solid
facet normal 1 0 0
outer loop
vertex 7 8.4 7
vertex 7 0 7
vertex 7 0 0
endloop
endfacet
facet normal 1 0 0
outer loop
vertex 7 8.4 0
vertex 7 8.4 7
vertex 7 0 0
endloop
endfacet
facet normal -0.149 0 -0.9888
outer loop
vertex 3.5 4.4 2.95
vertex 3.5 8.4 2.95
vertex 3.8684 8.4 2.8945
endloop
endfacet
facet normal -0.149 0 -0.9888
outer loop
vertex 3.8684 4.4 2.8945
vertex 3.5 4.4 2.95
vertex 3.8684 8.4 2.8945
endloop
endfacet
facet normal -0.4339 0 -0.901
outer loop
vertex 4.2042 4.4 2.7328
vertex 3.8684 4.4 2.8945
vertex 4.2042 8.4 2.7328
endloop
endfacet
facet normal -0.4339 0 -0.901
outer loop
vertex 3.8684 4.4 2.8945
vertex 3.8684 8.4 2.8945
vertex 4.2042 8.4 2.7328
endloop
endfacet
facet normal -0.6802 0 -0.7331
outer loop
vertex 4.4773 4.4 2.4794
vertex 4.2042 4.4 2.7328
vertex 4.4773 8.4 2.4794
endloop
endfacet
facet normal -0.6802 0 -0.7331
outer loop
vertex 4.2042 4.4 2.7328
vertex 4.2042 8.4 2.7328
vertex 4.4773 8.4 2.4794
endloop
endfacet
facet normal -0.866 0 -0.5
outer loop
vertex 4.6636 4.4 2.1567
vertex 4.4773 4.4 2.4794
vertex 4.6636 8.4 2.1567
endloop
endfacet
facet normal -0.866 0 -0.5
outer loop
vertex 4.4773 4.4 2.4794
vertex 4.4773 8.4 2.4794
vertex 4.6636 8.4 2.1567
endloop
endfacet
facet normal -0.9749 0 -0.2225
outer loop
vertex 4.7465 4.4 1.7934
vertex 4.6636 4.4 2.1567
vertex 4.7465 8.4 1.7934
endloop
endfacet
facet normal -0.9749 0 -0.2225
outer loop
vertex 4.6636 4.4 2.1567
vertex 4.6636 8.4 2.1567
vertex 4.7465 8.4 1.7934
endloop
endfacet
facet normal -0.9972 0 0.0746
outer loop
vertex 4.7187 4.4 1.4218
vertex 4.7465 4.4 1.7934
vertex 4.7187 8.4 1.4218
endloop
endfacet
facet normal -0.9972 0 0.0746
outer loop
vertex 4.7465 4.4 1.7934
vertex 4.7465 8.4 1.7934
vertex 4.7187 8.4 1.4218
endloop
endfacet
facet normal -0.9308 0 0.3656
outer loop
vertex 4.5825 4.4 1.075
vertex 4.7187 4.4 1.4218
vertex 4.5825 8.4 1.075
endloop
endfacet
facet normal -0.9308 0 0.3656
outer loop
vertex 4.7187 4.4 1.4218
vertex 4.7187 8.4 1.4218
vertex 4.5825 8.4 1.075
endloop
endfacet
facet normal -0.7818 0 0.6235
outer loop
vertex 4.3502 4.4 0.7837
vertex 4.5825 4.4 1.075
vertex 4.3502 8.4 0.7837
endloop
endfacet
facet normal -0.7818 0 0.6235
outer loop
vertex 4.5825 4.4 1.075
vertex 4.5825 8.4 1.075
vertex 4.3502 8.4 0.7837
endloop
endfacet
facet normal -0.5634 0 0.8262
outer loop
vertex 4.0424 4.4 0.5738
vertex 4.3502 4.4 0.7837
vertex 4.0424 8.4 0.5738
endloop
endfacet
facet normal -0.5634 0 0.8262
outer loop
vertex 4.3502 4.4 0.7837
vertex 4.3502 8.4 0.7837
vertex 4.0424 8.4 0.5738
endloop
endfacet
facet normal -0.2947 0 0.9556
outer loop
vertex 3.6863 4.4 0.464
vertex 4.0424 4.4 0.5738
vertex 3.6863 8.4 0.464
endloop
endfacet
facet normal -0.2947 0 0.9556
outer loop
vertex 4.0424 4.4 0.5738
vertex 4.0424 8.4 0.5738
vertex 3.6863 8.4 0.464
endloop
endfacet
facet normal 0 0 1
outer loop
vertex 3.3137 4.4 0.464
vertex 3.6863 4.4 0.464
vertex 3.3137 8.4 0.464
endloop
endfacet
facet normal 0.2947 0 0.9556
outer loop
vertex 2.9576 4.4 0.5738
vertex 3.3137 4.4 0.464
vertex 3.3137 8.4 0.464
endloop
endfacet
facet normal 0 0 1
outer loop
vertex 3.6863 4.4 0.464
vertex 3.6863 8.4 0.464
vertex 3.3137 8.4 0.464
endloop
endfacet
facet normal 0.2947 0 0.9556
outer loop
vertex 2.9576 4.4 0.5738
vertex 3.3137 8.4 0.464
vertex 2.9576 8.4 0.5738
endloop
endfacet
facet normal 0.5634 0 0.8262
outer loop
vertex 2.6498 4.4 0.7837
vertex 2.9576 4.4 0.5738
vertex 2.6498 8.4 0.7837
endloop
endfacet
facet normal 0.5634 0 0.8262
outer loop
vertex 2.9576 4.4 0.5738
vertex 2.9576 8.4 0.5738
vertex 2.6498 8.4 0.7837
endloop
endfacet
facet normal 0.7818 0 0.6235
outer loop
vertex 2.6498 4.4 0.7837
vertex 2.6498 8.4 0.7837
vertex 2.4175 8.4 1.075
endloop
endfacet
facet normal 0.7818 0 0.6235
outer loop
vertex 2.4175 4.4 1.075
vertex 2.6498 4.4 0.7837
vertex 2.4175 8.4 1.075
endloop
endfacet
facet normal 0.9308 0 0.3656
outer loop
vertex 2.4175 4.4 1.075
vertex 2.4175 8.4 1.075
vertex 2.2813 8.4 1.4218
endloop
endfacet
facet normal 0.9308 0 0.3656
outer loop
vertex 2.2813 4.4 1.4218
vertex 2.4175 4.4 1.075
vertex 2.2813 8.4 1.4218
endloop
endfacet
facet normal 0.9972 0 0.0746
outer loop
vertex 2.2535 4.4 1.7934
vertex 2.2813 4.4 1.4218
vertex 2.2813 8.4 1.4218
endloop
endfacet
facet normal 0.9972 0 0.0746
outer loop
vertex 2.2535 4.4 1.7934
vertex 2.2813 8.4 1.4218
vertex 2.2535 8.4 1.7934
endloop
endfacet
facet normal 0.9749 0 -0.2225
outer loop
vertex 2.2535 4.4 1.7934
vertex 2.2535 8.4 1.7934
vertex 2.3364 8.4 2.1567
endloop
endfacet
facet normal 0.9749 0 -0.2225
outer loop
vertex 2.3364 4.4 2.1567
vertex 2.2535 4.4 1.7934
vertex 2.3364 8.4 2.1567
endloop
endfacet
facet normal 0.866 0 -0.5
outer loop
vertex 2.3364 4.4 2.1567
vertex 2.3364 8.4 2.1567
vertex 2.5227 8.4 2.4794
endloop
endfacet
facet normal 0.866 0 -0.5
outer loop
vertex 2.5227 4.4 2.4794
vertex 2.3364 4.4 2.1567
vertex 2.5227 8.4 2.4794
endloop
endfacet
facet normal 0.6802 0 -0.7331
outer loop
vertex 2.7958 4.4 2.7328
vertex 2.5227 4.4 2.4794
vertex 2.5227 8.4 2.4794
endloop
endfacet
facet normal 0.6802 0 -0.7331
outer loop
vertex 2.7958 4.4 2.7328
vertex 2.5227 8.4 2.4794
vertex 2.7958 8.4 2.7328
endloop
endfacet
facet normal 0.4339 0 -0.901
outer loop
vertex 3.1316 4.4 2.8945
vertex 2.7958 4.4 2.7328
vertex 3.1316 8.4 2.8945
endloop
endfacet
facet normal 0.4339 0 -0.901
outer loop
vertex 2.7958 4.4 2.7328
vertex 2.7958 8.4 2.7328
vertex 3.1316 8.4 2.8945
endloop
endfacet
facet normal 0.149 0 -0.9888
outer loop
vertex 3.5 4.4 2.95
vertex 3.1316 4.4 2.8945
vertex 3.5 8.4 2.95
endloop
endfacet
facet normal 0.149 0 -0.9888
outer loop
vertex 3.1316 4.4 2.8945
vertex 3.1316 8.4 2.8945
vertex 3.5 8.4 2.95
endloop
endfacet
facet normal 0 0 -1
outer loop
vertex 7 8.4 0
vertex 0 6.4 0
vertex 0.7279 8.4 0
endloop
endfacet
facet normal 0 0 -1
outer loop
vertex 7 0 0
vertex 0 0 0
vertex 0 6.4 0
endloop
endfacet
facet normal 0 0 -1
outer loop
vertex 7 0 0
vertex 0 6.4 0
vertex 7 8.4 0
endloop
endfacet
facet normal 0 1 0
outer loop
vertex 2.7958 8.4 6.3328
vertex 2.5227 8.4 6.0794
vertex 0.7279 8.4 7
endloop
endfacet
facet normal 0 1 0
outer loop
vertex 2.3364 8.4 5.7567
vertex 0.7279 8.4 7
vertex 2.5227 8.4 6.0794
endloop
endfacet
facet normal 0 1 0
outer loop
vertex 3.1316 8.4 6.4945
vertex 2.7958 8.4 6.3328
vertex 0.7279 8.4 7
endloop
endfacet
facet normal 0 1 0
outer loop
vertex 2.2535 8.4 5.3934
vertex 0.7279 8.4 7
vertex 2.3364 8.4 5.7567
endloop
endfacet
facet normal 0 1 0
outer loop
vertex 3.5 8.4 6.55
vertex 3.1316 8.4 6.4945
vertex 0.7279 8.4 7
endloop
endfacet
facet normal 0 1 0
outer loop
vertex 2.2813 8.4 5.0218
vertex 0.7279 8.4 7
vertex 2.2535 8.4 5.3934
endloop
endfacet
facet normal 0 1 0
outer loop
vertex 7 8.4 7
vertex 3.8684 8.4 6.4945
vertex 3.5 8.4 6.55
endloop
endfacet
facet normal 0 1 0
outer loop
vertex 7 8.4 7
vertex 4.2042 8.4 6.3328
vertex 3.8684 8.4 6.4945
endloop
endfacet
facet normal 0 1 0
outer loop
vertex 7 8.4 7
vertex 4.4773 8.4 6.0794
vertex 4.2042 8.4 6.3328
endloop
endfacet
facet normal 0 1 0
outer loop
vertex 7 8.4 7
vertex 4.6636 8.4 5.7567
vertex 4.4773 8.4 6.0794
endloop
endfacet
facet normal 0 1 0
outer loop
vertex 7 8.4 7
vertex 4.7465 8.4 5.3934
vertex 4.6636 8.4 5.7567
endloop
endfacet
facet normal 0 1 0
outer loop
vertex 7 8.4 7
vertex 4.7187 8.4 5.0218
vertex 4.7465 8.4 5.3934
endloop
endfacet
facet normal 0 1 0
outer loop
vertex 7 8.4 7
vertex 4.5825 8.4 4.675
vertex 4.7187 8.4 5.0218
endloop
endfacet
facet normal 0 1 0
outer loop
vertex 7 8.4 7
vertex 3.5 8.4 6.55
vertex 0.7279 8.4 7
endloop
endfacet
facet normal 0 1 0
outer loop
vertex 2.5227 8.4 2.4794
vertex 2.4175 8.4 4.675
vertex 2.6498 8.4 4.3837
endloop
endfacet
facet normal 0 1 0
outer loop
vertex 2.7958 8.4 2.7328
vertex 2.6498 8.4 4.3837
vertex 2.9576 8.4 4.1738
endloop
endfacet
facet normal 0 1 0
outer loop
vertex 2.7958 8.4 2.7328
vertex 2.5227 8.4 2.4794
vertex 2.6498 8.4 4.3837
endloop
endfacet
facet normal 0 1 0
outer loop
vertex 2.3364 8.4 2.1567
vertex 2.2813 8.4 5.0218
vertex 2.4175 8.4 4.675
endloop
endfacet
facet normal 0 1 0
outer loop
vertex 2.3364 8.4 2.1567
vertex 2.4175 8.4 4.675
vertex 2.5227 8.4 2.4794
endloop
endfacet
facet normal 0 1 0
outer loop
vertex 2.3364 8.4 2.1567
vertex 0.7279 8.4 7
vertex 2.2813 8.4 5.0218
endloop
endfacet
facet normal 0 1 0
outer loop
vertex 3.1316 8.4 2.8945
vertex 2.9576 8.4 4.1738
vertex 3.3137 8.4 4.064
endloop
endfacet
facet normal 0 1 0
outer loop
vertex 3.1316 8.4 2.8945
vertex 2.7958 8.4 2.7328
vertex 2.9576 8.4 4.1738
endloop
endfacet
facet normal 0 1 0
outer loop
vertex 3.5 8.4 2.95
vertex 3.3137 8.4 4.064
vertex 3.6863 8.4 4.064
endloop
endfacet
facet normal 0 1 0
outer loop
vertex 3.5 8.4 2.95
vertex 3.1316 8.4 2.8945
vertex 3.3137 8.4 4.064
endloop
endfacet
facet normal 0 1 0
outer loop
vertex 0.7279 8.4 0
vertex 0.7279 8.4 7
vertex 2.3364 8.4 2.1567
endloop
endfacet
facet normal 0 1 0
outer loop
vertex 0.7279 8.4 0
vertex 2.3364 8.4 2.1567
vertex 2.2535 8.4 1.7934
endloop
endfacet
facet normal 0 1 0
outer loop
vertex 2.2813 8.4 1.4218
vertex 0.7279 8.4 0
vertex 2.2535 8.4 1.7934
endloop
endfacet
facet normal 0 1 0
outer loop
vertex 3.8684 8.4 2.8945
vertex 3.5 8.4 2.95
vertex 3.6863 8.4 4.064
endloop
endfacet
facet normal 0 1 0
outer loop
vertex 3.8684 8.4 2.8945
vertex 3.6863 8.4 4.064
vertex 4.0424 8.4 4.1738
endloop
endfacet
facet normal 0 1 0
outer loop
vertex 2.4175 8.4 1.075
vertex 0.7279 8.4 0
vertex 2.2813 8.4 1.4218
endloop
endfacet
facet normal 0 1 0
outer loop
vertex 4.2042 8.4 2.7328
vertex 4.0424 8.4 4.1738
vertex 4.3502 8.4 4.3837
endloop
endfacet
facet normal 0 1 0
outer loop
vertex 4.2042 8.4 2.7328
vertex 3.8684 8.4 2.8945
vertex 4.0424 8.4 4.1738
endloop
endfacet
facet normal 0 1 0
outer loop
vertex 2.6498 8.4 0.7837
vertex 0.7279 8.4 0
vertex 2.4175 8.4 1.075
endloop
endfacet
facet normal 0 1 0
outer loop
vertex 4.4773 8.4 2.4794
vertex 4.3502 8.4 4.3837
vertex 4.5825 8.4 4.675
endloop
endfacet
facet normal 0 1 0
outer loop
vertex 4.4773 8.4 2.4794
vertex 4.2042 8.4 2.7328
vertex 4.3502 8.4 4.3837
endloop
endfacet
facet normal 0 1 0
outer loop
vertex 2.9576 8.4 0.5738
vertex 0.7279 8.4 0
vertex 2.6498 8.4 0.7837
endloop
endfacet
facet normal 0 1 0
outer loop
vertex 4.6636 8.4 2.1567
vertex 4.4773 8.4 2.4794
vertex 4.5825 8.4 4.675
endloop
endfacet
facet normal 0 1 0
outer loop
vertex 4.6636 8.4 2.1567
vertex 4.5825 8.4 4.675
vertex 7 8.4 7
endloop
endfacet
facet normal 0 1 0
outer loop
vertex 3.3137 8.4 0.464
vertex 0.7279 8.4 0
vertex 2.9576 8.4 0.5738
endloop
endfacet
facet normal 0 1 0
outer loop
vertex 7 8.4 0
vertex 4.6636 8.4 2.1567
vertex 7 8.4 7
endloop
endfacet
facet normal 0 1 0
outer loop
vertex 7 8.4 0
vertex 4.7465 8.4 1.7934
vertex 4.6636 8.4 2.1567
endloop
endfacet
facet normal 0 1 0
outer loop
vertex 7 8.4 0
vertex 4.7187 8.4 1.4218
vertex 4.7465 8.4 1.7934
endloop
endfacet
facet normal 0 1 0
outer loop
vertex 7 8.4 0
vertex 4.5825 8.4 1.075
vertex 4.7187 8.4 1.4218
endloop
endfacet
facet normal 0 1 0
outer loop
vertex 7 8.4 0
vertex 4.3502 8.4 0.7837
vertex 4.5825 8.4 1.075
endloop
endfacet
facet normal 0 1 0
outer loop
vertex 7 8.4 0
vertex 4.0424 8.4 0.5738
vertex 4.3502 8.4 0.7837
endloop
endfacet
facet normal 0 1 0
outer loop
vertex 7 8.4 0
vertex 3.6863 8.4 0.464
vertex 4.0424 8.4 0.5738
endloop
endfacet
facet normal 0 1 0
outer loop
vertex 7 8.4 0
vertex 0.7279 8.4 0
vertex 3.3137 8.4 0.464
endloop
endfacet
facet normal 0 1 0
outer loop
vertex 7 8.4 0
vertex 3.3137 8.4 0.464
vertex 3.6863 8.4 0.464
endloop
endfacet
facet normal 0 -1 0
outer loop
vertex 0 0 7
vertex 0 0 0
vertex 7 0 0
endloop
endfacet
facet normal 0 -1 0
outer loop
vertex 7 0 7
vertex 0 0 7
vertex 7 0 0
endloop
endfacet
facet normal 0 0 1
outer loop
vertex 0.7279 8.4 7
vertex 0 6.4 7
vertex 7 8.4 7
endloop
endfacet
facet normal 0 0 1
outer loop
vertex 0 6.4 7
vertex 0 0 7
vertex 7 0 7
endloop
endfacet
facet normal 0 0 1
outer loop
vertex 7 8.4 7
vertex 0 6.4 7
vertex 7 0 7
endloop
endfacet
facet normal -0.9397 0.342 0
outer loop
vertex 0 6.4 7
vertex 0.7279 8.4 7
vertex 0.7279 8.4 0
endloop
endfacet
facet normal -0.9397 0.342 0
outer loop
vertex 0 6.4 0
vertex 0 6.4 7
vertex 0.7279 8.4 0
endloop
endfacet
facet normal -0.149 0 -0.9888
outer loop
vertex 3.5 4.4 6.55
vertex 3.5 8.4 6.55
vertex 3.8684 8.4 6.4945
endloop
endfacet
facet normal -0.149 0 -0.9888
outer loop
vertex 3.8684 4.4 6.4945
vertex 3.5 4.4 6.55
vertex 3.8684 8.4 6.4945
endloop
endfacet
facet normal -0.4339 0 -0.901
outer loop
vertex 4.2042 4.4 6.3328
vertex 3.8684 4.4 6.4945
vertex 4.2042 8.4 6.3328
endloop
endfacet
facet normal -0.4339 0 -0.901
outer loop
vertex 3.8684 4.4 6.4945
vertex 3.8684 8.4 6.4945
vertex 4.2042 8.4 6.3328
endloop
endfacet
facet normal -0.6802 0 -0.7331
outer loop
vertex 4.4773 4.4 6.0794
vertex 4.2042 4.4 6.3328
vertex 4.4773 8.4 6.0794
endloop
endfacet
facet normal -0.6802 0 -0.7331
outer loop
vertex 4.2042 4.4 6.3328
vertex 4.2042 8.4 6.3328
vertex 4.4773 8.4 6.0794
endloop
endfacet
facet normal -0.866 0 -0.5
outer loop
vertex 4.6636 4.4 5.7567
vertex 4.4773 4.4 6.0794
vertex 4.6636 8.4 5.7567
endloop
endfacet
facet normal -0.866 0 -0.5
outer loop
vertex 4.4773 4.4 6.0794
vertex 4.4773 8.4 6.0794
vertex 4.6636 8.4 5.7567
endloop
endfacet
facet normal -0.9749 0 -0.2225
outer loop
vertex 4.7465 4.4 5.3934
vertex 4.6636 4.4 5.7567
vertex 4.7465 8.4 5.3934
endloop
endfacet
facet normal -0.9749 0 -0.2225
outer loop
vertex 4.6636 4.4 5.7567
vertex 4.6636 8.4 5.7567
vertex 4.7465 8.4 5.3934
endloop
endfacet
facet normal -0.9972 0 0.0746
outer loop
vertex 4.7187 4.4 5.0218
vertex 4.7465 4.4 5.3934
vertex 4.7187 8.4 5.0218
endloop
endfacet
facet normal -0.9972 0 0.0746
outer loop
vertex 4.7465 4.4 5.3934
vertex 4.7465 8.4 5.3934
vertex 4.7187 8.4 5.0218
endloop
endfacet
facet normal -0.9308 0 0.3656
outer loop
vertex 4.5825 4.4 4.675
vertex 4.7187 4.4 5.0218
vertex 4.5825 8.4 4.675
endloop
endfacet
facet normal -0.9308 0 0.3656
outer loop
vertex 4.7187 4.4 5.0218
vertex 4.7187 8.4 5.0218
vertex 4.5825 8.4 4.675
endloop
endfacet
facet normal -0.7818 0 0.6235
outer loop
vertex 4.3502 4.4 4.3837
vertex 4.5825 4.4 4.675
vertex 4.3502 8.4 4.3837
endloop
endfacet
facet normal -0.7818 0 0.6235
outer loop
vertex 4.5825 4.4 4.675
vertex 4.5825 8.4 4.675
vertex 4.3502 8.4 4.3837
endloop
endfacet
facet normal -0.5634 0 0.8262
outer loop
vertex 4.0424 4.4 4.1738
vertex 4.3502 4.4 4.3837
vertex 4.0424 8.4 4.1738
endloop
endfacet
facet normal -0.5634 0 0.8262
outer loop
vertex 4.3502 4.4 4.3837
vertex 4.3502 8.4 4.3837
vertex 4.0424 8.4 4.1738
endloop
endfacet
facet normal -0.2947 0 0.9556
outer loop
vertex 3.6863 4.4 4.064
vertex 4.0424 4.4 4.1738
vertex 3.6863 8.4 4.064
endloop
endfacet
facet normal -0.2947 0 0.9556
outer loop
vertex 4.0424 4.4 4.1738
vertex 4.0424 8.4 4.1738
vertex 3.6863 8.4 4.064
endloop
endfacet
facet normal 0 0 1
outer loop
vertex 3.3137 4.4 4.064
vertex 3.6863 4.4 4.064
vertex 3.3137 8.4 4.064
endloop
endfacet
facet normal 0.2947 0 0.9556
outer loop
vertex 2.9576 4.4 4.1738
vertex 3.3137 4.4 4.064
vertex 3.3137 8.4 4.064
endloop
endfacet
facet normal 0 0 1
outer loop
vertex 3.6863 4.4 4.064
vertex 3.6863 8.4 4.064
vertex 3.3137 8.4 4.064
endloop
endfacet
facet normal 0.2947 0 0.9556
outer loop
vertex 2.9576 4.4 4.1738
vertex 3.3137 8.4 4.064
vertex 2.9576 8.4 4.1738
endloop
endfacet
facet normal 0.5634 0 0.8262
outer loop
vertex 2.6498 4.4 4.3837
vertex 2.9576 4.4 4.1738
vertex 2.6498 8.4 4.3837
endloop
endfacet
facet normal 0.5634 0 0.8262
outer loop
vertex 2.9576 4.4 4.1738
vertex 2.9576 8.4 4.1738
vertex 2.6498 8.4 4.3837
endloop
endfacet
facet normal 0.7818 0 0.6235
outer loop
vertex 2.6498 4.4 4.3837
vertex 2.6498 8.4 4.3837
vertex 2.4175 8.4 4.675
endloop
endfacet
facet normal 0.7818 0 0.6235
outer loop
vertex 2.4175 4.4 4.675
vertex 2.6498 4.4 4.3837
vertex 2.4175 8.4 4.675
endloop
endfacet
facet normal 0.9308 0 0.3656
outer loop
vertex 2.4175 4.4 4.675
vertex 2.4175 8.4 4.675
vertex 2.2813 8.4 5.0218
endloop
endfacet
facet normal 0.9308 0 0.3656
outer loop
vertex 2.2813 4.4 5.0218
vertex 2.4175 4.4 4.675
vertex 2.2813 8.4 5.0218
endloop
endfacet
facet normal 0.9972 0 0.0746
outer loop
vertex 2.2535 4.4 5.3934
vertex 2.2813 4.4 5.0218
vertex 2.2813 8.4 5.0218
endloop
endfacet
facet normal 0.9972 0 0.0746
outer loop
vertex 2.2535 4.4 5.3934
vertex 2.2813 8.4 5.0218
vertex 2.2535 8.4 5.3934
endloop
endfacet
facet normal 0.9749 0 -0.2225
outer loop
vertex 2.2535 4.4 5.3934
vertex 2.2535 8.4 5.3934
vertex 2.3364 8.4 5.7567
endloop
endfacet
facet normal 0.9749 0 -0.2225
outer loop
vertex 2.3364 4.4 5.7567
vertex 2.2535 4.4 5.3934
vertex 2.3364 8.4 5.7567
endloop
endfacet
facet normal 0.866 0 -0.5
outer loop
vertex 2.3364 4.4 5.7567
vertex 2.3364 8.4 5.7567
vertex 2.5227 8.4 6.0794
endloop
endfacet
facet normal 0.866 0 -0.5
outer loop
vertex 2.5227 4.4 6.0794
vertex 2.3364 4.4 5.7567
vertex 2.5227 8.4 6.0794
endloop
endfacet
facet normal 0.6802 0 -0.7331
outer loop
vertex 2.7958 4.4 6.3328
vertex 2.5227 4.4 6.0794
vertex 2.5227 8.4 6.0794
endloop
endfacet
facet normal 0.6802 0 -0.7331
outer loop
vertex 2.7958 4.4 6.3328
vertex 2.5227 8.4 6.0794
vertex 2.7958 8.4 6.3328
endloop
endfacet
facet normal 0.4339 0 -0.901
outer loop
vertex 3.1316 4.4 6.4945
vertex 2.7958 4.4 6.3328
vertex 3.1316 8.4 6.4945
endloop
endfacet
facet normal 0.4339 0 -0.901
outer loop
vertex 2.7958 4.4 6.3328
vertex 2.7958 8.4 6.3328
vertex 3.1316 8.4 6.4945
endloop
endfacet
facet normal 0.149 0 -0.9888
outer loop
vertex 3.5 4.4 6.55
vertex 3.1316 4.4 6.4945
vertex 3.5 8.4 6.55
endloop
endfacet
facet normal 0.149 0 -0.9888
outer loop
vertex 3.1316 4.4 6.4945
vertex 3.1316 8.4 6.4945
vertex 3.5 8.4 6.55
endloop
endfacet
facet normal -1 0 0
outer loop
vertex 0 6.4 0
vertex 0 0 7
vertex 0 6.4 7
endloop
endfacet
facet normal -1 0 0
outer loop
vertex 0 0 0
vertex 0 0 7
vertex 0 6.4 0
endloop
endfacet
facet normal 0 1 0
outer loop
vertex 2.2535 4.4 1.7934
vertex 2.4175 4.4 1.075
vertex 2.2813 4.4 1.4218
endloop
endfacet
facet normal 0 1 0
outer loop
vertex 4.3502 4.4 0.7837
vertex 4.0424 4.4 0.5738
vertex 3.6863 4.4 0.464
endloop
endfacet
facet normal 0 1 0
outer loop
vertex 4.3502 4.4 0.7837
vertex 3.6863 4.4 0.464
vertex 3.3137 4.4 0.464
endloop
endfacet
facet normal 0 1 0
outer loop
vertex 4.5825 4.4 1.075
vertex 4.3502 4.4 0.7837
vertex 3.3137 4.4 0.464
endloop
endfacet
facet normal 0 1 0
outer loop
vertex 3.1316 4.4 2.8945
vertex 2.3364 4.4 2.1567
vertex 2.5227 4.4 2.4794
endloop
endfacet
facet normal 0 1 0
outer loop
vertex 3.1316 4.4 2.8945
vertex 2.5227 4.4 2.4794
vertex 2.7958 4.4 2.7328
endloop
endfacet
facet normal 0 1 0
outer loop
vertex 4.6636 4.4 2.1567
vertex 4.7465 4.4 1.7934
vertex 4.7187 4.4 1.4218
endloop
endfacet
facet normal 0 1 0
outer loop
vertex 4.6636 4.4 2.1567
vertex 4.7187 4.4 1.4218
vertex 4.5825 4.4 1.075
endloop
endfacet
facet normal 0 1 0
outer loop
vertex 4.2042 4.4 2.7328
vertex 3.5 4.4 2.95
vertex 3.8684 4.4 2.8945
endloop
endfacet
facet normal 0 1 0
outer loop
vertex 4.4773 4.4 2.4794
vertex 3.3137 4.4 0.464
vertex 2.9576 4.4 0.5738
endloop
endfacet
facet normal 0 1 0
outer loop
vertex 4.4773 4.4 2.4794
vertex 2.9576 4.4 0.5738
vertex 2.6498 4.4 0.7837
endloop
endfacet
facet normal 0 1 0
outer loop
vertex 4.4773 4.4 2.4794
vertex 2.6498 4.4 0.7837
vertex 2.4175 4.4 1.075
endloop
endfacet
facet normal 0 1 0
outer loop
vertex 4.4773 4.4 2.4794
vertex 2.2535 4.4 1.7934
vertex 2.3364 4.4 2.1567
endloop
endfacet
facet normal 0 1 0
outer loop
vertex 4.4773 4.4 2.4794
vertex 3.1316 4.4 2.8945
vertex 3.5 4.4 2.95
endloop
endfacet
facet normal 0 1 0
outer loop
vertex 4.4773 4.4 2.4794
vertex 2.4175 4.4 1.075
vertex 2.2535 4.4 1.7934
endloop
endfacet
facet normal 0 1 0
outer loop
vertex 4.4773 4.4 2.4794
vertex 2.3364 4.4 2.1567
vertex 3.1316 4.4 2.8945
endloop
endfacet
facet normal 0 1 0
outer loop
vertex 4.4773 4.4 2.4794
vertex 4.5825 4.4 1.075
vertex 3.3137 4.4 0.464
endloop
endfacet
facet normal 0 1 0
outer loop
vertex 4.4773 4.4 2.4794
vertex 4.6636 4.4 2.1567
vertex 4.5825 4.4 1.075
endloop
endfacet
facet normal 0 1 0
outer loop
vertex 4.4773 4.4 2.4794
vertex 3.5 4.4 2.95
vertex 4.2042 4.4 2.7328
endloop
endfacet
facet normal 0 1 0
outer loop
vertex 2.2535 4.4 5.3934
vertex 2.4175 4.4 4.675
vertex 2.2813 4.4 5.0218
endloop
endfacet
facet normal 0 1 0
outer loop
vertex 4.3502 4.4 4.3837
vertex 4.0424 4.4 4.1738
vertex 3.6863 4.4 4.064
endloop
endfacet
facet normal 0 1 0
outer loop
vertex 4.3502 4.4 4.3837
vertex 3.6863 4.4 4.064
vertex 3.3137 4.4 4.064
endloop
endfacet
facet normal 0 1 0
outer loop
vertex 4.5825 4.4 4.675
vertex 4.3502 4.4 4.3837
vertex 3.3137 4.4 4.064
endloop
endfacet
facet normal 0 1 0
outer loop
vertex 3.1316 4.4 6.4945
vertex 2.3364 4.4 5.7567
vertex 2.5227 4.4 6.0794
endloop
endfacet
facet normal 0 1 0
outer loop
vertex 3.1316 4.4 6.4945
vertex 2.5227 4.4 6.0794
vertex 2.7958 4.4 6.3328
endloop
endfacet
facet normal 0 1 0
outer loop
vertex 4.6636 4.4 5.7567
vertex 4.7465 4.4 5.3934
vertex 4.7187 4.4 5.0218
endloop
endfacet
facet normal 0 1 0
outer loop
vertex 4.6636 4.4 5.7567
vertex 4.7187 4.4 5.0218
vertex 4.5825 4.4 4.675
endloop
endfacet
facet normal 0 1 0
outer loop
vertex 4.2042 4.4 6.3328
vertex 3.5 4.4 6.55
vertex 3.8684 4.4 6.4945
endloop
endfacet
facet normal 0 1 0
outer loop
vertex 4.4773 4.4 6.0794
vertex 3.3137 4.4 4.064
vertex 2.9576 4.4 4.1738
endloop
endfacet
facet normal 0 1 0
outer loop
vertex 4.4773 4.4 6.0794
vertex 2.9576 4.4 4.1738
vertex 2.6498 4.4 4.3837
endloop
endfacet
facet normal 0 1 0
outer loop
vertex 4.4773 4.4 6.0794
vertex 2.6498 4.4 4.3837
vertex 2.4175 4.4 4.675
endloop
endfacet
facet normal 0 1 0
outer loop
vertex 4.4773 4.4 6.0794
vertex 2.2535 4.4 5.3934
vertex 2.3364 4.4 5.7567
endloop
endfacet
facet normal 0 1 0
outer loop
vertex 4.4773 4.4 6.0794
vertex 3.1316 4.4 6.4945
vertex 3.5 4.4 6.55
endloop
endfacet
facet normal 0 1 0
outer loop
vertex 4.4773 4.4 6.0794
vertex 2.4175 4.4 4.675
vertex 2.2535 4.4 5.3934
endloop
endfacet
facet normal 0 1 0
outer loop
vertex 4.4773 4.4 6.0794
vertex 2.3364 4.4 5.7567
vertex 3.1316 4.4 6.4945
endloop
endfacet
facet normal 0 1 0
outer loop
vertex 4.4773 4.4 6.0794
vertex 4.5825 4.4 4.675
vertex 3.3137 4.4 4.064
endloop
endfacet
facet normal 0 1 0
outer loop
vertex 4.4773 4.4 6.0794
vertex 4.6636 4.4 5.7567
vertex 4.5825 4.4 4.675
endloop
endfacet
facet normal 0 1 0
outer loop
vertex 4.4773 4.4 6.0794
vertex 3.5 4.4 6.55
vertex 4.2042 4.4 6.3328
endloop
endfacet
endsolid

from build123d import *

# Parameters (mm, degrees)
ESQUISSE1_W             = 7
ESQUISSE1_H             = 7
BOSS_EXTRU_1_DEPTH      = 8.4
CHANFREIN1_SIZE         = 2
CHANFREIN1_SIZE2        = 0.727940469
ESQUISSE2_R             = 1.25
ENL_V_MAT_EXTRU_1_DEPTH = 4


with BuildPart() as part:
    # Esquisse1 → Boss.-Extru.1 (new body)
    with BuildSketch(Plane(origin=(0, 0, 0), x_dir=(1, 0, 0), z_dir=(0, 1, 0))):
        with Locations((3.5, -3.5)):
            Rectangle(ESQUISSE1_W, ESQUISSE1_H)
    extrude(amount=BOSS_EXTRU_1_DEPTH)

    # Chanfrein1
    chanfrein1_edges = [part.edges().sort_by_distance(p)[0] for p in [
        (0, 8.4, 3.5),
    ]]
    chanfrein1_side = [part.faces().sort_by_distance(p)[0] for p in [
        (0, 4.2, 3.5),
    ]]
    chamfer(chanfrein1_edges, length=CHANFREIN1_SIZE, length2=CHANFREIN1_SIZE2, reference=chanfrein1_side[0])

    # Esquisse2 → Enlèv. mat.-Extru.1 (cut)
    with BuildSketch(Plane(origin=(0, 8.4, 0), x_dir=(1, 0, 0), z_dir=(0, 1, 0))):
        with Locations(Location((3.5, -1.7, 0), (0, 0, 270))):
            Circle(ESQUISSE2_R)
        with Locations(Location((3.5, -5.3, 0), (0, 0, 270))):
            Circle(ESQUISSE2_R)
    extrude(amount=-ENL_V_MAT_EXTRU_1_DEPTH, mode=Mode.SUBTRACT)


solid = part.part
